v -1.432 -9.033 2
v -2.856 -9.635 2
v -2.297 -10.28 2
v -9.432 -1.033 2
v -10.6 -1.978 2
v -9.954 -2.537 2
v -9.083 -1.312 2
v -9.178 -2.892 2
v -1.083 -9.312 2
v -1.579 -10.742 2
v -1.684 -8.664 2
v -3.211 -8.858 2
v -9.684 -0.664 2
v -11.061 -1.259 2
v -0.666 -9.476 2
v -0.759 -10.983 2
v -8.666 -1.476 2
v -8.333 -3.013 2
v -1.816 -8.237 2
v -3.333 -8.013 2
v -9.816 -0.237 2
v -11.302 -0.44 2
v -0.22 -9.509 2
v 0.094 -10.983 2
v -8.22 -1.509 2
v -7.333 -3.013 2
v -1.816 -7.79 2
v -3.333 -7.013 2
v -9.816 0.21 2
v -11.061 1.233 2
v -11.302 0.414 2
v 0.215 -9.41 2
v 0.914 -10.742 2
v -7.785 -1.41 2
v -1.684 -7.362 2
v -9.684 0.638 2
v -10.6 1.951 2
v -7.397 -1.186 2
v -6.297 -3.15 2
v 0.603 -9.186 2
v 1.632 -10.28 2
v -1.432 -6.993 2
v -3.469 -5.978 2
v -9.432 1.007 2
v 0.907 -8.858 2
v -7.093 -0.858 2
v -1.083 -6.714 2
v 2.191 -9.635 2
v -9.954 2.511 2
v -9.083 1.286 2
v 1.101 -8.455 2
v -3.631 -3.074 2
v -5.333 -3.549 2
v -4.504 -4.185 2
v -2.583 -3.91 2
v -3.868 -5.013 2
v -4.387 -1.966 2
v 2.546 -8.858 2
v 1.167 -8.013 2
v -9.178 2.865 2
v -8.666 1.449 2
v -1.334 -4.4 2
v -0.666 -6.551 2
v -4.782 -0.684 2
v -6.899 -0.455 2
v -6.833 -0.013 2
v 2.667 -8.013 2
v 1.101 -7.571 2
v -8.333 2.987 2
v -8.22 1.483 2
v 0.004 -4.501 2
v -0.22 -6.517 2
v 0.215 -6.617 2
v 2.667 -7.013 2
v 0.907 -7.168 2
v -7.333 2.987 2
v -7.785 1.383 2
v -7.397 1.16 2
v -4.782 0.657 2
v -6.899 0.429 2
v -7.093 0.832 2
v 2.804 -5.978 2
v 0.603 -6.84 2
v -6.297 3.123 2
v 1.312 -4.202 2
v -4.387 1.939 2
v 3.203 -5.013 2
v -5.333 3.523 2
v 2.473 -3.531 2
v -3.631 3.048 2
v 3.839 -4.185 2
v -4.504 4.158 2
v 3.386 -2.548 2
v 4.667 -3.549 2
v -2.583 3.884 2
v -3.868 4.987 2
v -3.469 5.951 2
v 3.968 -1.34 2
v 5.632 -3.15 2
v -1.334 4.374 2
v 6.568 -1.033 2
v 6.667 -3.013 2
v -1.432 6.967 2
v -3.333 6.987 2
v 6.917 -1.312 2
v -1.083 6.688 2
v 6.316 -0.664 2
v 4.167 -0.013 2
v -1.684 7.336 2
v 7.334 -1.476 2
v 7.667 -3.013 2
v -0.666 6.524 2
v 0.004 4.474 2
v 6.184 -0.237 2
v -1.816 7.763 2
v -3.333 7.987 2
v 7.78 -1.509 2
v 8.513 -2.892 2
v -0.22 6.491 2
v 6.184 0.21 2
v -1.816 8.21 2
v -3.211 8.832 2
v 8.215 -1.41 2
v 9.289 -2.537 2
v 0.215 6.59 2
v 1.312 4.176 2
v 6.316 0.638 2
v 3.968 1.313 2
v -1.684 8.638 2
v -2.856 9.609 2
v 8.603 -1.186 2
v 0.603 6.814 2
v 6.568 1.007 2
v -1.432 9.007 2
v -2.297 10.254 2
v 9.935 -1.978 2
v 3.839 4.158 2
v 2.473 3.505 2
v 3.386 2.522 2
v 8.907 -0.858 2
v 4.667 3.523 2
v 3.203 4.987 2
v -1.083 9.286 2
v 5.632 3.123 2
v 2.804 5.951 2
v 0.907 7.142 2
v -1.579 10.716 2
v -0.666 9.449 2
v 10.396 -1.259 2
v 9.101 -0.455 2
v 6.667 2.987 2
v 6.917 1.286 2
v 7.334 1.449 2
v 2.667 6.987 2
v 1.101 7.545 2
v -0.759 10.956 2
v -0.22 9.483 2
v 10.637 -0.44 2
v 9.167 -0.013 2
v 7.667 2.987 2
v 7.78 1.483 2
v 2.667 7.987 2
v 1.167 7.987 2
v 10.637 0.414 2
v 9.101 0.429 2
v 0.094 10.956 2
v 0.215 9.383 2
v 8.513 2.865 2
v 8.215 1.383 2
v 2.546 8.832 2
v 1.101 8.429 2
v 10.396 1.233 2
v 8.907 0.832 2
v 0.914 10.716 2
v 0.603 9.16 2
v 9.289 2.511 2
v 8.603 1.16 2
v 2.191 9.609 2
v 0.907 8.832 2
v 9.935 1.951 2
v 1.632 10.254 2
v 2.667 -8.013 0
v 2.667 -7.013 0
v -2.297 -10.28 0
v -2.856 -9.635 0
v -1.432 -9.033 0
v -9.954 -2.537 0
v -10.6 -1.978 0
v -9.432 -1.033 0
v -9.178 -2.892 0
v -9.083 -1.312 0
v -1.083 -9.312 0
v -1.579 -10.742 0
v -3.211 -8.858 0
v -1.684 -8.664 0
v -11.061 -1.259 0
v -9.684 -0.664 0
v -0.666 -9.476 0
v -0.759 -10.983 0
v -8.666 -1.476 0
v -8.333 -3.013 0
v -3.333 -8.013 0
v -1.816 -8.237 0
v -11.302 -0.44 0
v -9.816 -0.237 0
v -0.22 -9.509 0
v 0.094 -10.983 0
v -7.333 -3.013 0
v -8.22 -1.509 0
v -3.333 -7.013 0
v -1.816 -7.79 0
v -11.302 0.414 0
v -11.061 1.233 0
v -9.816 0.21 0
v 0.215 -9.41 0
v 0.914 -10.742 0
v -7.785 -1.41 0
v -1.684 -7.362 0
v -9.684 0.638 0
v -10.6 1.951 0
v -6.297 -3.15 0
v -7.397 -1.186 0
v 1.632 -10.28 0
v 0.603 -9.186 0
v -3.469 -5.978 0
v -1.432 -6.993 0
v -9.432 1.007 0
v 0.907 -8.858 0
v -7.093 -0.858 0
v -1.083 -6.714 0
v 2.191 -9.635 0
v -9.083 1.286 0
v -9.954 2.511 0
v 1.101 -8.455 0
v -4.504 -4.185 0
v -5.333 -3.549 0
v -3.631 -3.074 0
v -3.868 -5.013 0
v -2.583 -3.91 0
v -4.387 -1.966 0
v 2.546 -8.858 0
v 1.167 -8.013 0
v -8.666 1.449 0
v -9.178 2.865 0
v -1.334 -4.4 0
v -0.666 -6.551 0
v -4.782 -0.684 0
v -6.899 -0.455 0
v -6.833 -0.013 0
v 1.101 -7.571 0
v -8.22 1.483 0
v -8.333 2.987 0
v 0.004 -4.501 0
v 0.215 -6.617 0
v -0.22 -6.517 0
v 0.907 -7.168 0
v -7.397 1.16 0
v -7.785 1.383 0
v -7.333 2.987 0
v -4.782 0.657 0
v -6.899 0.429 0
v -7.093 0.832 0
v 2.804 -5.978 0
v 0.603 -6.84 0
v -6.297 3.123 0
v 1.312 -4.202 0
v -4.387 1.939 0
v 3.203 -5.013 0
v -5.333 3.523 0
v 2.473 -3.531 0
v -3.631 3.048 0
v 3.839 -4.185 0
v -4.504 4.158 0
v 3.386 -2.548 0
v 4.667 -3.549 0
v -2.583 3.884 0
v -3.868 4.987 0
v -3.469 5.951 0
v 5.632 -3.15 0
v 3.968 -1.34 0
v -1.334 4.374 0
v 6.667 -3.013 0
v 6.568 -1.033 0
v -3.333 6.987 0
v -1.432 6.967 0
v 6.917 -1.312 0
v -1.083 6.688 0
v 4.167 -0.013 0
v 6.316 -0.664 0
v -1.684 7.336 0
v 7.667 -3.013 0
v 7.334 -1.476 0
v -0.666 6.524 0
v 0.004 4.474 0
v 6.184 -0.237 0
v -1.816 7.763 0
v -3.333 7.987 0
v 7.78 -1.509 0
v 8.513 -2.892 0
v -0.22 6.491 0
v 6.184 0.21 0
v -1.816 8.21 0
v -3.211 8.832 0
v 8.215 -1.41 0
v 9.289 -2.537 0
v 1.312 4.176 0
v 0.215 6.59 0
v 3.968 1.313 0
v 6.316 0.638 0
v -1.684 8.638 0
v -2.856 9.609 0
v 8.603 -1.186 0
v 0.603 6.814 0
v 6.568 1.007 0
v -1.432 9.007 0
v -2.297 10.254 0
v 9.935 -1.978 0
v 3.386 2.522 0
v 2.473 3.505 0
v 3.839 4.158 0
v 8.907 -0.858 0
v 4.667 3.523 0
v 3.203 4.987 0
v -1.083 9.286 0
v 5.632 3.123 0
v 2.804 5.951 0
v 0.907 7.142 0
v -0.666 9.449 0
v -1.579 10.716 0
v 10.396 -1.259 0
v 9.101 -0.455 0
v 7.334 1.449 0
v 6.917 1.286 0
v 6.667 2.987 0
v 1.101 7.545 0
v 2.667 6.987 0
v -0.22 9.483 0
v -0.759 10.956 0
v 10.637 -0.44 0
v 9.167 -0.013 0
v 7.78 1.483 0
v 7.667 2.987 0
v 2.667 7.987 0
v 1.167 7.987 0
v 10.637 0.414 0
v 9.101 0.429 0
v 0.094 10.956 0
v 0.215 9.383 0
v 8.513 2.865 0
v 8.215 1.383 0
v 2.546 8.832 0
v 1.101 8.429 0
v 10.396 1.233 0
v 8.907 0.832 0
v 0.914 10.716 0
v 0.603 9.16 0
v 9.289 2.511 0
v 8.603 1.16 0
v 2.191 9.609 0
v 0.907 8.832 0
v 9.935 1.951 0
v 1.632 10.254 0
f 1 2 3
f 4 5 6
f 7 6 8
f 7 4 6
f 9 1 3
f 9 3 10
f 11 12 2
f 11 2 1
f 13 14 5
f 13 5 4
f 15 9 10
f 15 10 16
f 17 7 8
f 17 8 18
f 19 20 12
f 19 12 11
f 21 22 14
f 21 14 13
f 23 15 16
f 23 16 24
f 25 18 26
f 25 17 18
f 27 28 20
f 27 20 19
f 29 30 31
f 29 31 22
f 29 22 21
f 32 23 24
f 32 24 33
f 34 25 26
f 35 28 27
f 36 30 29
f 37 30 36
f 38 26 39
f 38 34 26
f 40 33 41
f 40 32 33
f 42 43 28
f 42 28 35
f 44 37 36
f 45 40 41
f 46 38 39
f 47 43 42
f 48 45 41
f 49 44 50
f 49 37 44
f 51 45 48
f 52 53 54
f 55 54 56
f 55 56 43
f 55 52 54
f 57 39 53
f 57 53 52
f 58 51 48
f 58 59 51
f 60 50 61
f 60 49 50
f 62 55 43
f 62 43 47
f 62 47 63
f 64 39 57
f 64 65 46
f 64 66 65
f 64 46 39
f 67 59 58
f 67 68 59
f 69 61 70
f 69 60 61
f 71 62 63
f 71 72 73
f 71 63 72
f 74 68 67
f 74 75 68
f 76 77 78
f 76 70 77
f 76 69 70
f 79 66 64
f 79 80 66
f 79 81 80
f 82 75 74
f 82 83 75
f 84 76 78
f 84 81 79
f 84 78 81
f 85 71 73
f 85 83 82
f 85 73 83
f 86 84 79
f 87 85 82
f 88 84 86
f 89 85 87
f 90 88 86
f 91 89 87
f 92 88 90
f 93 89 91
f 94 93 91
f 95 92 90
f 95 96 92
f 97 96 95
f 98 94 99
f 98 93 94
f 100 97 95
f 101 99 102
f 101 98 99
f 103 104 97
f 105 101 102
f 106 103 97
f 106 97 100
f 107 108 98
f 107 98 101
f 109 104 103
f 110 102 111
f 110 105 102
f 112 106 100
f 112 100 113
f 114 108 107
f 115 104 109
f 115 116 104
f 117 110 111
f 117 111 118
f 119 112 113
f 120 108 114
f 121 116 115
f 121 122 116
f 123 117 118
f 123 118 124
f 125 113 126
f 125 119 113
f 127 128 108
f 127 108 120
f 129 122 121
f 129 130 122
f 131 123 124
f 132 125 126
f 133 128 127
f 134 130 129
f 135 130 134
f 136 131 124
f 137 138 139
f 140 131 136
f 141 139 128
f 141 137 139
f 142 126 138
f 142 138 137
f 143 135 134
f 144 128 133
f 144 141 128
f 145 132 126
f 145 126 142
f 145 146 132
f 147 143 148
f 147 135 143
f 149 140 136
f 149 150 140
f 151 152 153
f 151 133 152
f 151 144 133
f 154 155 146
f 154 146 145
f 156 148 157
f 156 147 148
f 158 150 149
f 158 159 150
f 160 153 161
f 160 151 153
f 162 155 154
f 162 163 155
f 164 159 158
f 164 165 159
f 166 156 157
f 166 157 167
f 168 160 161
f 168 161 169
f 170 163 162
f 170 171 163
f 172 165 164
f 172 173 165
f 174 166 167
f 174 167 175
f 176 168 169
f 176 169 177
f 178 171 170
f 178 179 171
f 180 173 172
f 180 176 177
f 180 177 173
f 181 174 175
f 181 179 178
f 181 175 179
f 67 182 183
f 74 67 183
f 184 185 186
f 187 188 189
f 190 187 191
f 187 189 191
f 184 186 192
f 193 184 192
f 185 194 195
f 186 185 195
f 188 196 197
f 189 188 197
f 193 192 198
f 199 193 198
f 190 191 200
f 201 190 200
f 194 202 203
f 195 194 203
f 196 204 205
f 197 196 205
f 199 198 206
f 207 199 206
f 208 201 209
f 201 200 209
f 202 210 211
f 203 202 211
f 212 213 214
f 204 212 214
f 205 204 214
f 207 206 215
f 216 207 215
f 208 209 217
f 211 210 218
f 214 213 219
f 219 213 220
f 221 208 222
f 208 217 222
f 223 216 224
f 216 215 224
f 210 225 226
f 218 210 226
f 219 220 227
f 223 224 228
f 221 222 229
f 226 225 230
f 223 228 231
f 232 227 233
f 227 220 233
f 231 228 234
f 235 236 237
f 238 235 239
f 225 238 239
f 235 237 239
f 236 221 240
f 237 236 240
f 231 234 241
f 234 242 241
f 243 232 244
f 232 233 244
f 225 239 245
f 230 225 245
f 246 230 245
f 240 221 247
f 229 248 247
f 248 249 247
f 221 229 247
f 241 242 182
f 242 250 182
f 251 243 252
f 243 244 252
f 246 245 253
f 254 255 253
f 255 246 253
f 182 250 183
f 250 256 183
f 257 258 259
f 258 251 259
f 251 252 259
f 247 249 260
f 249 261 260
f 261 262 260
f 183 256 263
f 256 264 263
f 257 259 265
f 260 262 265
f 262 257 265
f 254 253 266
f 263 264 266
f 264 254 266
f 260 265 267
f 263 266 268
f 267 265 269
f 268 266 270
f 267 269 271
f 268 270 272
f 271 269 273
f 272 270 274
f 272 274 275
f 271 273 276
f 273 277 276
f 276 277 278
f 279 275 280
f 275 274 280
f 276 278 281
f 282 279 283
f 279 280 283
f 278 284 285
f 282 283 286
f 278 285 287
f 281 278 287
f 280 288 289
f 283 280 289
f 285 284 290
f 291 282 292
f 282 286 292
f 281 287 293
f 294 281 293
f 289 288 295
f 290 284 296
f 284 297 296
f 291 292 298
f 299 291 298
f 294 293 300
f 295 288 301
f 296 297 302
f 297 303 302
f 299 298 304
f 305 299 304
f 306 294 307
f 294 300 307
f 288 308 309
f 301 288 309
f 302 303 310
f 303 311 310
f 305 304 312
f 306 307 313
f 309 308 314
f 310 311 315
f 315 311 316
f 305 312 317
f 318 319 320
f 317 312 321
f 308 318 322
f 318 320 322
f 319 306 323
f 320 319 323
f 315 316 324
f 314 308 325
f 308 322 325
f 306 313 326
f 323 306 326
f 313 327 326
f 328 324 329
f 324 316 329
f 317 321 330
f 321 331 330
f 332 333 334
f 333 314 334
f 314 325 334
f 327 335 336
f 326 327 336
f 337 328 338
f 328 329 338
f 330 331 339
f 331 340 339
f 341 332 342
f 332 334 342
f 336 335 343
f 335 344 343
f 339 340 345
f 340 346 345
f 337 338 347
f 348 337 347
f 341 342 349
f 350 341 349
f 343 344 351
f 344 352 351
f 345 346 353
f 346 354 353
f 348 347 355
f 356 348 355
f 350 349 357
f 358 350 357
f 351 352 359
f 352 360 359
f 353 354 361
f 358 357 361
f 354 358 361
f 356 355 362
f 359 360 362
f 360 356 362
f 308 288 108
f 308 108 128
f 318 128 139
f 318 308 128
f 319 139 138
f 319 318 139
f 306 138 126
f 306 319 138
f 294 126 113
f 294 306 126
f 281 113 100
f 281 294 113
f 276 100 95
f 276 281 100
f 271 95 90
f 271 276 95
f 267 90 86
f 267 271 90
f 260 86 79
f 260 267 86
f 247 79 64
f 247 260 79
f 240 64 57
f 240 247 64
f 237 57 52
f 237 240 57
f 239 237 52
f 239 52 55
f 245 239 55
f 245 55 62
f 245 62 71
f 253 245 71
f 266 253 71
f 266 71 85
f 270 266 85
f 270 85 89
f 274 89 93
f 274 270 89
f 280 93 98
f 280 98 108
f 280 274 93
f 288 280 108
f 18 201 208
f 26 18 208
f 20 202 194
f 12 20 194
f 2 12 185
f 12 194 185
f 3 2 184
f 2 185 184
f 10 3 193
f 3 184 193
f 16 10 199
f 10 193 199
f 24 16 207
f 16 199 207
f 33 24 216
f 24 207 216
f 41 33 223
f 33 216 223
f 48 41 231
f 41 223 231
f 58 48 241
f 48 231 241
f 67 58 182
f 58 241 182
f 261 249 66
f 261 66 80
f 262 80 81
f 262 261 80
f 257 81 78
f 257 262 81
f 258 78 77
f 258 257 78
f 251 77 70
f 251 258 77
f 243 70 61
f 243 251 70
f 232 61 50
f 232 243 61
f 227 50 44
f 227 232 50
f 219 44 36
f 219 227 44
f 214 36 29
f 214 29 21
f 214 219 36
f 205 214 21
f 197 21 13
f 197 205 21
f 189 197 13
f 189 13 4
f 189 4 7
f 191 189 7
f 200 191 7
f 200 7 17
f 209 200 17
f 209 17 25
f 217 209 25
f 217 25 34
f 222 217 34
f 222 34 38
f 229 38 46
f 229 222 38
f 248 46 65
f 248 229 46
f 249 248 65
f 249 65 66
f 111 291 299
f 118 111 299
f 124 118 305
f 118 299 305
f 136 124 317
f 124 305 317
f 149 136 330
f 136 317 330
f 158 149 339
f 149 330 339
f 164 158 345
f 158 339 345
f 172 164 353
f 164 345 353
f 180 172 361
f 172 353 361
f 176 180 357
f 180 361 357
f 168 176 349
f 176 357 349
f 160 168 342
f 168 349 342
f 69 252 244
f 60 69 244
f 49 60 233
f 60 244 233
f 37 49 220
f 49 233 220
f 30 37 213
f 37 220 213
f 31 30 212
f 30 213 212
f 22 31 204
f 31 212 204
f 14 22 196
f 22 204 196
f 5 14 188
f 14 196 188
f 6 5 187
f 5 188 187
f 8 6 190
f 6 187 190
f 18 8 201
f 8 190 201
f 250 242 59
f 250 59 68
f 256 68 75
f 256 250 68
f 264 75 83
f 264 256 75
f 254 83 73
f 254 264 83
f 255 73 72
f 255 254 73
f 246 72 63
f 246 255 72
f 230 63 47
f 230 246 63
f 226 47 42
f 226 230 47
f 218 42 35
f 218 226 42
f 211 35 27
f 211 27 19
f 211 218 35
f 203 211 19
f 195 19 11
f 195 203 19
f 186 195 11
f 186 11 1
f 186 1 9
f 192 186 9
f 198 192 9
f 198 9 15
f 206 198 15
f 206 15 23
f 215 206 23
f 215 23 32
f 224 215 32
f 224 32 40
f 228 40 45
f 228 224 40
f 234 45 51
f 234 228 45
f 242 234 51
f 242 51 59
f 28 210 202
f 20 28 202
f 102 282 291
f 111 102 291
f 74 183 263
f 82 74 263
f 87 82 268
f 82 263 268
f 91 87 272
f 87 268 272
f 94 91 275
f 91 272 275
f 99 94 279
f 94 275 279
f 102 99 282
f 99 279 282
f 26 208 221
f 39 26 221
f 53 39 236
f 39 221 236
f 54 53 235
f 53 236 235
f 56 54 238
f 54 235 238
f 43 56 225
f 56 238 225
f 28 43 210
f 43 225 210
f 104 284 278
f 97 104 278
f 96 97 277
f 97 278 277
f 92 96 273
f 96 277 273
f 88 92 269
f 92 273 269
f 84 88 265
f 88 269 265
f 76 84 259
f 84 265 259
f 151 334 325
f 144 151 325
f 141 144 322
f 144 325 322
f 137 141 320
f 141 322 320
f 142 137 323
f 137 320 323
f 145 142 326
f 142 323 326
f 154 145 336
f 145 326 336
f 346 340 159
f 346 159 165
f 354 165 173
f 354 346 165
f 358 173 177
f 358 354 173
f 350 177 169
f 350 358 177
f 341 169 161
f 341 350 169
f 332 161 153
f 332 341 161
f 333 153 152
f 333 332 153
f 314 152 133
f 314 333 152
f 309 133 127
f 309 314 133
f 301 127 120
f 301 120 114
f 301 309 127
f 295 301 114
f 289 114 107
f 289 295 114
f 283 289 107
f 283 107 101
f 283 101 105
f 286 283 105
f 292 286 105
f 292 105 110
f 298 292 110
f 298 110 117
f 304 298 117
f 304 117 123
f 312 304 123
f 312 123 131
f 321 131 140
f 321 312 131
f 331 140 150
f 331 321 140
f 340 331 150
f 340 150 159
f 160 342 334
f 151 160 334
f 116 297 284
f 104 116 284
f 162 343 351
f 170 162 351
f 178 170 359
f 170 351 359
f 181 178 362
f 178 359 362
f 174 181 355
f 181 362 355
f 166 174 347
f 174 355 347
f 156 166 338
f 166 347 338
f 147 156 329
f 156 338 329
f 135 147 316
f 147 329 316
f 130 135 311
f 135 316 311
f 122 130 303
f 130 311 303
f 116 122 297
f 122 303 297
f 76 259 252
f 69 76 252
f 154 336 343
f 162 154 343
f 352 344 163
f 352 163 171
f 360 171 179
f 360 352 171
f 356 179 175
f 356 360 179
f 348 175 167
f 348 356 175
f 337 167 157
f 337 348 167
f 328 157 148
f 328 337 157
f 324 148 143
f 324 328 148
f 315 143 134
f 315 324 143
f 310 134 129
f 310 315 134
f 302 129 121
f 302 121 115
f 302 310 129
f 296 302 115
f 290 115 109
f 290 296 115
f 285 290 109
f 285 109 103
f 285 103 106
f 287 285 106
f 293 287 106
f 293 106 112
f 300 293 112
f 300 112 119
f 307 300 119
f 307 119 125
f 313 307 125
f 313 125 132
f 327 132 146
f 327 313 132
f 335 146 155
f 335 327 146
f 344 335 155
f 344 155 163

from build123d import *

# Parameters (mm, degrees)
F0_R     = 1.5
F0_R_2   = 4.5
F1_DEPTH = 2


with BuildPart() as f1:
    # F0 (on Top) → F1 (new body)
    with BuildSketch(Plane.XY):
        with BuildLine():
            ThreePointArc((-8.332531, 2.986763), (-11.332531, -0.013237), (-8.332531, -3.013237))
            Line((-8.332531, -3.013237), (-7.332531, -3.013237))
            ThreePointArc((-7.332531, -3.013237), (-4.504103, -4.184809), (-3.332531, -7.013237))
            Line((-3.332531, -7.013237), (-3.332531, -8.013237))
            ThreePointArc((-3.332531, -8.013237), (-0.332531, -11.013237), (2.667469, -8.013237))
            Line((2.667469, -8.013237), (2.667469, -7.013237))
            ThreePointArc((2.667469, -7.013237), (3.839042, -4.184809), (6.667469, -3.013237))
            Line((6.667469, -3.013237), (7.667469, -3.013237))
            ThreePointArc((7.667469, -3.013237), (10.667469, -0.013237), (7.667469, 2.986763))
            Line((7.667469, 2.986763), (6.667469, 2.986763))
            ThreePointArc((6.667469, 2.986763), (3.839042, 4.158336), (2.667469, 6.986763))
            Line((2.667469, 6.986763), (2.667469, 7.986763))
            ThreePointArc((2.667469, 7.986763), (-0.332531, 10.986763), (-3.332531, 7.986763))
            Line((-3.332531, 7.986763), (-3.332531, 6.986763))
            ThreePointArc((-3.332531, 6.986763), (-4.504103, 4.158336), (-7.332531, 2.986763))
            Line((-7.332531, 2.986763), (-8.332531, 2.986763))
        make_face()
        with Locations((-0.332531, -8.013237)):
            Circle(F0_R, mode=Mode.SUBTRACT)
        with Locations((-8.332531, -0.013237)):
            Circle(F0_R, mode=Mode.SUBTRACT)
        with Locations((-0.332531, -0.013237)):
            Circle(F0_R_2, mode=Mode.SUBTRACT)
        with Locations((7.667469, -0.013237)):
            Circle(F0_R, mode=Mode.SUBTRACT)
        with Locations((-0.332531, 7.986763)):
            Circle(F0_R, mode=Mode.SUBTRACT)
    extrude(amount=F1_DEPTH)


solid = f1.part
